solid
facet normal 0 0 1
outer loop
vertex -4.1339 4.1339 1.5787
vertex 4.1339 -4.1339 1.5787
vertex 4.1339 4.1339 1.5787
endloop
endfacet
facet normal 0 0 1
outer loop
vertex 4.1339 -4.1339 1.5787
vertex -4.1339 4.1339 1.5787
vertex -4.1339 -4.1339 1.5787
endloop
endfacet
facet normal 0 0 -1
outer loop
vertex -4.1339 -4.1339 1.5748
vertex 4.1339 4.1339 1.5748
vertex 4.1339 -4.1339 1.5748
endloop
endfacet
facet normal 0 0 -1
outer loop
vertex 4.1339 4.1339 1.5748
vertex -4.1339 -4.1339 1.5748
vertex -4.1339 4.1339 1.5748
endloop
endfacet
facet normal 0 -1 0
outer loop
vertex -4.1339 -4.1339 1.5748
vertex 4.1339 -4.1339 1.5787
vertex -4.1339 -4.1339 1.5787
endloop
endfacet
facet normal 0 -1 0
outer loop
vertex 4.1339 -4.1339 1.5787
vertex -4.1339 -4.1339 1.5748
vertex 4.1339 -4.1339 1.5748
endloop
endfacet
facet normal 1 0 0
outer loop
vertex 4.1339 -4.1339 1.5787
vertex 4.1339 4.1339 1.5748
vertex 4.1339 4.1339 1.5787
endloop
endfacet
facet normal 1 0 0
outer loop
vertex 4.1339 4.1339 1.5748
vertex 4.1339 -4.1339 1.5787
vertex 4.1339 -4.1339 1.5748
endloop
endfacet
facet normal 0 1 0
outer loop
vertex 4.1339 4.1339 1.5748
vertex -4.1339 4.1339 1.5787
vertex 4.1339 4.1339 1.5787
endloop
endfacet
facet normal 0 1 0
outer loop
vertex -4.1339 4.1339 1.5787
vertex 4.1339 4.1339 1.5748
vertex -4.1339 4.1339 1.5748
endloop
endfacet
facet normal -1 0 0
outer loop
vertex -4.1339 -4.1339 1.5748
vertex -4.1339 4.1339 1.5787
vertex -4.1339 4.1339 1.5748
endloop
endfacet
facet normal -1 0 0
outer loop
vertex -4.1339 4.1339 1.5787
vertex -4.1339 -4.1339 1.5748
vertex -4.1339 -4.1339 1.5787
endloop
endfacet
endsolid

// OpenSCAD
// file: defines.scad
L = 25.0;
W = 25.0;
H = 4.0;

/* Смещение вывода */
pin_d = 0.8;
pin_h = 2.0;
pin_ox = 1.8;
pin_oy = 1.8;

c_d = 4;  // Диаметр скругления

$fn = 32;

scale = 1/2.54;
// main file
include <defines.scad>

b = 2;
s_h = 0.01;

scale(scale) color([0.85,0.85,0.85]) {

  translate([-L/2 + b, -W/2 + b, H]) {
    cube(size=[L-2*b, W-2*b, 0.01], center=false);
  }
}
